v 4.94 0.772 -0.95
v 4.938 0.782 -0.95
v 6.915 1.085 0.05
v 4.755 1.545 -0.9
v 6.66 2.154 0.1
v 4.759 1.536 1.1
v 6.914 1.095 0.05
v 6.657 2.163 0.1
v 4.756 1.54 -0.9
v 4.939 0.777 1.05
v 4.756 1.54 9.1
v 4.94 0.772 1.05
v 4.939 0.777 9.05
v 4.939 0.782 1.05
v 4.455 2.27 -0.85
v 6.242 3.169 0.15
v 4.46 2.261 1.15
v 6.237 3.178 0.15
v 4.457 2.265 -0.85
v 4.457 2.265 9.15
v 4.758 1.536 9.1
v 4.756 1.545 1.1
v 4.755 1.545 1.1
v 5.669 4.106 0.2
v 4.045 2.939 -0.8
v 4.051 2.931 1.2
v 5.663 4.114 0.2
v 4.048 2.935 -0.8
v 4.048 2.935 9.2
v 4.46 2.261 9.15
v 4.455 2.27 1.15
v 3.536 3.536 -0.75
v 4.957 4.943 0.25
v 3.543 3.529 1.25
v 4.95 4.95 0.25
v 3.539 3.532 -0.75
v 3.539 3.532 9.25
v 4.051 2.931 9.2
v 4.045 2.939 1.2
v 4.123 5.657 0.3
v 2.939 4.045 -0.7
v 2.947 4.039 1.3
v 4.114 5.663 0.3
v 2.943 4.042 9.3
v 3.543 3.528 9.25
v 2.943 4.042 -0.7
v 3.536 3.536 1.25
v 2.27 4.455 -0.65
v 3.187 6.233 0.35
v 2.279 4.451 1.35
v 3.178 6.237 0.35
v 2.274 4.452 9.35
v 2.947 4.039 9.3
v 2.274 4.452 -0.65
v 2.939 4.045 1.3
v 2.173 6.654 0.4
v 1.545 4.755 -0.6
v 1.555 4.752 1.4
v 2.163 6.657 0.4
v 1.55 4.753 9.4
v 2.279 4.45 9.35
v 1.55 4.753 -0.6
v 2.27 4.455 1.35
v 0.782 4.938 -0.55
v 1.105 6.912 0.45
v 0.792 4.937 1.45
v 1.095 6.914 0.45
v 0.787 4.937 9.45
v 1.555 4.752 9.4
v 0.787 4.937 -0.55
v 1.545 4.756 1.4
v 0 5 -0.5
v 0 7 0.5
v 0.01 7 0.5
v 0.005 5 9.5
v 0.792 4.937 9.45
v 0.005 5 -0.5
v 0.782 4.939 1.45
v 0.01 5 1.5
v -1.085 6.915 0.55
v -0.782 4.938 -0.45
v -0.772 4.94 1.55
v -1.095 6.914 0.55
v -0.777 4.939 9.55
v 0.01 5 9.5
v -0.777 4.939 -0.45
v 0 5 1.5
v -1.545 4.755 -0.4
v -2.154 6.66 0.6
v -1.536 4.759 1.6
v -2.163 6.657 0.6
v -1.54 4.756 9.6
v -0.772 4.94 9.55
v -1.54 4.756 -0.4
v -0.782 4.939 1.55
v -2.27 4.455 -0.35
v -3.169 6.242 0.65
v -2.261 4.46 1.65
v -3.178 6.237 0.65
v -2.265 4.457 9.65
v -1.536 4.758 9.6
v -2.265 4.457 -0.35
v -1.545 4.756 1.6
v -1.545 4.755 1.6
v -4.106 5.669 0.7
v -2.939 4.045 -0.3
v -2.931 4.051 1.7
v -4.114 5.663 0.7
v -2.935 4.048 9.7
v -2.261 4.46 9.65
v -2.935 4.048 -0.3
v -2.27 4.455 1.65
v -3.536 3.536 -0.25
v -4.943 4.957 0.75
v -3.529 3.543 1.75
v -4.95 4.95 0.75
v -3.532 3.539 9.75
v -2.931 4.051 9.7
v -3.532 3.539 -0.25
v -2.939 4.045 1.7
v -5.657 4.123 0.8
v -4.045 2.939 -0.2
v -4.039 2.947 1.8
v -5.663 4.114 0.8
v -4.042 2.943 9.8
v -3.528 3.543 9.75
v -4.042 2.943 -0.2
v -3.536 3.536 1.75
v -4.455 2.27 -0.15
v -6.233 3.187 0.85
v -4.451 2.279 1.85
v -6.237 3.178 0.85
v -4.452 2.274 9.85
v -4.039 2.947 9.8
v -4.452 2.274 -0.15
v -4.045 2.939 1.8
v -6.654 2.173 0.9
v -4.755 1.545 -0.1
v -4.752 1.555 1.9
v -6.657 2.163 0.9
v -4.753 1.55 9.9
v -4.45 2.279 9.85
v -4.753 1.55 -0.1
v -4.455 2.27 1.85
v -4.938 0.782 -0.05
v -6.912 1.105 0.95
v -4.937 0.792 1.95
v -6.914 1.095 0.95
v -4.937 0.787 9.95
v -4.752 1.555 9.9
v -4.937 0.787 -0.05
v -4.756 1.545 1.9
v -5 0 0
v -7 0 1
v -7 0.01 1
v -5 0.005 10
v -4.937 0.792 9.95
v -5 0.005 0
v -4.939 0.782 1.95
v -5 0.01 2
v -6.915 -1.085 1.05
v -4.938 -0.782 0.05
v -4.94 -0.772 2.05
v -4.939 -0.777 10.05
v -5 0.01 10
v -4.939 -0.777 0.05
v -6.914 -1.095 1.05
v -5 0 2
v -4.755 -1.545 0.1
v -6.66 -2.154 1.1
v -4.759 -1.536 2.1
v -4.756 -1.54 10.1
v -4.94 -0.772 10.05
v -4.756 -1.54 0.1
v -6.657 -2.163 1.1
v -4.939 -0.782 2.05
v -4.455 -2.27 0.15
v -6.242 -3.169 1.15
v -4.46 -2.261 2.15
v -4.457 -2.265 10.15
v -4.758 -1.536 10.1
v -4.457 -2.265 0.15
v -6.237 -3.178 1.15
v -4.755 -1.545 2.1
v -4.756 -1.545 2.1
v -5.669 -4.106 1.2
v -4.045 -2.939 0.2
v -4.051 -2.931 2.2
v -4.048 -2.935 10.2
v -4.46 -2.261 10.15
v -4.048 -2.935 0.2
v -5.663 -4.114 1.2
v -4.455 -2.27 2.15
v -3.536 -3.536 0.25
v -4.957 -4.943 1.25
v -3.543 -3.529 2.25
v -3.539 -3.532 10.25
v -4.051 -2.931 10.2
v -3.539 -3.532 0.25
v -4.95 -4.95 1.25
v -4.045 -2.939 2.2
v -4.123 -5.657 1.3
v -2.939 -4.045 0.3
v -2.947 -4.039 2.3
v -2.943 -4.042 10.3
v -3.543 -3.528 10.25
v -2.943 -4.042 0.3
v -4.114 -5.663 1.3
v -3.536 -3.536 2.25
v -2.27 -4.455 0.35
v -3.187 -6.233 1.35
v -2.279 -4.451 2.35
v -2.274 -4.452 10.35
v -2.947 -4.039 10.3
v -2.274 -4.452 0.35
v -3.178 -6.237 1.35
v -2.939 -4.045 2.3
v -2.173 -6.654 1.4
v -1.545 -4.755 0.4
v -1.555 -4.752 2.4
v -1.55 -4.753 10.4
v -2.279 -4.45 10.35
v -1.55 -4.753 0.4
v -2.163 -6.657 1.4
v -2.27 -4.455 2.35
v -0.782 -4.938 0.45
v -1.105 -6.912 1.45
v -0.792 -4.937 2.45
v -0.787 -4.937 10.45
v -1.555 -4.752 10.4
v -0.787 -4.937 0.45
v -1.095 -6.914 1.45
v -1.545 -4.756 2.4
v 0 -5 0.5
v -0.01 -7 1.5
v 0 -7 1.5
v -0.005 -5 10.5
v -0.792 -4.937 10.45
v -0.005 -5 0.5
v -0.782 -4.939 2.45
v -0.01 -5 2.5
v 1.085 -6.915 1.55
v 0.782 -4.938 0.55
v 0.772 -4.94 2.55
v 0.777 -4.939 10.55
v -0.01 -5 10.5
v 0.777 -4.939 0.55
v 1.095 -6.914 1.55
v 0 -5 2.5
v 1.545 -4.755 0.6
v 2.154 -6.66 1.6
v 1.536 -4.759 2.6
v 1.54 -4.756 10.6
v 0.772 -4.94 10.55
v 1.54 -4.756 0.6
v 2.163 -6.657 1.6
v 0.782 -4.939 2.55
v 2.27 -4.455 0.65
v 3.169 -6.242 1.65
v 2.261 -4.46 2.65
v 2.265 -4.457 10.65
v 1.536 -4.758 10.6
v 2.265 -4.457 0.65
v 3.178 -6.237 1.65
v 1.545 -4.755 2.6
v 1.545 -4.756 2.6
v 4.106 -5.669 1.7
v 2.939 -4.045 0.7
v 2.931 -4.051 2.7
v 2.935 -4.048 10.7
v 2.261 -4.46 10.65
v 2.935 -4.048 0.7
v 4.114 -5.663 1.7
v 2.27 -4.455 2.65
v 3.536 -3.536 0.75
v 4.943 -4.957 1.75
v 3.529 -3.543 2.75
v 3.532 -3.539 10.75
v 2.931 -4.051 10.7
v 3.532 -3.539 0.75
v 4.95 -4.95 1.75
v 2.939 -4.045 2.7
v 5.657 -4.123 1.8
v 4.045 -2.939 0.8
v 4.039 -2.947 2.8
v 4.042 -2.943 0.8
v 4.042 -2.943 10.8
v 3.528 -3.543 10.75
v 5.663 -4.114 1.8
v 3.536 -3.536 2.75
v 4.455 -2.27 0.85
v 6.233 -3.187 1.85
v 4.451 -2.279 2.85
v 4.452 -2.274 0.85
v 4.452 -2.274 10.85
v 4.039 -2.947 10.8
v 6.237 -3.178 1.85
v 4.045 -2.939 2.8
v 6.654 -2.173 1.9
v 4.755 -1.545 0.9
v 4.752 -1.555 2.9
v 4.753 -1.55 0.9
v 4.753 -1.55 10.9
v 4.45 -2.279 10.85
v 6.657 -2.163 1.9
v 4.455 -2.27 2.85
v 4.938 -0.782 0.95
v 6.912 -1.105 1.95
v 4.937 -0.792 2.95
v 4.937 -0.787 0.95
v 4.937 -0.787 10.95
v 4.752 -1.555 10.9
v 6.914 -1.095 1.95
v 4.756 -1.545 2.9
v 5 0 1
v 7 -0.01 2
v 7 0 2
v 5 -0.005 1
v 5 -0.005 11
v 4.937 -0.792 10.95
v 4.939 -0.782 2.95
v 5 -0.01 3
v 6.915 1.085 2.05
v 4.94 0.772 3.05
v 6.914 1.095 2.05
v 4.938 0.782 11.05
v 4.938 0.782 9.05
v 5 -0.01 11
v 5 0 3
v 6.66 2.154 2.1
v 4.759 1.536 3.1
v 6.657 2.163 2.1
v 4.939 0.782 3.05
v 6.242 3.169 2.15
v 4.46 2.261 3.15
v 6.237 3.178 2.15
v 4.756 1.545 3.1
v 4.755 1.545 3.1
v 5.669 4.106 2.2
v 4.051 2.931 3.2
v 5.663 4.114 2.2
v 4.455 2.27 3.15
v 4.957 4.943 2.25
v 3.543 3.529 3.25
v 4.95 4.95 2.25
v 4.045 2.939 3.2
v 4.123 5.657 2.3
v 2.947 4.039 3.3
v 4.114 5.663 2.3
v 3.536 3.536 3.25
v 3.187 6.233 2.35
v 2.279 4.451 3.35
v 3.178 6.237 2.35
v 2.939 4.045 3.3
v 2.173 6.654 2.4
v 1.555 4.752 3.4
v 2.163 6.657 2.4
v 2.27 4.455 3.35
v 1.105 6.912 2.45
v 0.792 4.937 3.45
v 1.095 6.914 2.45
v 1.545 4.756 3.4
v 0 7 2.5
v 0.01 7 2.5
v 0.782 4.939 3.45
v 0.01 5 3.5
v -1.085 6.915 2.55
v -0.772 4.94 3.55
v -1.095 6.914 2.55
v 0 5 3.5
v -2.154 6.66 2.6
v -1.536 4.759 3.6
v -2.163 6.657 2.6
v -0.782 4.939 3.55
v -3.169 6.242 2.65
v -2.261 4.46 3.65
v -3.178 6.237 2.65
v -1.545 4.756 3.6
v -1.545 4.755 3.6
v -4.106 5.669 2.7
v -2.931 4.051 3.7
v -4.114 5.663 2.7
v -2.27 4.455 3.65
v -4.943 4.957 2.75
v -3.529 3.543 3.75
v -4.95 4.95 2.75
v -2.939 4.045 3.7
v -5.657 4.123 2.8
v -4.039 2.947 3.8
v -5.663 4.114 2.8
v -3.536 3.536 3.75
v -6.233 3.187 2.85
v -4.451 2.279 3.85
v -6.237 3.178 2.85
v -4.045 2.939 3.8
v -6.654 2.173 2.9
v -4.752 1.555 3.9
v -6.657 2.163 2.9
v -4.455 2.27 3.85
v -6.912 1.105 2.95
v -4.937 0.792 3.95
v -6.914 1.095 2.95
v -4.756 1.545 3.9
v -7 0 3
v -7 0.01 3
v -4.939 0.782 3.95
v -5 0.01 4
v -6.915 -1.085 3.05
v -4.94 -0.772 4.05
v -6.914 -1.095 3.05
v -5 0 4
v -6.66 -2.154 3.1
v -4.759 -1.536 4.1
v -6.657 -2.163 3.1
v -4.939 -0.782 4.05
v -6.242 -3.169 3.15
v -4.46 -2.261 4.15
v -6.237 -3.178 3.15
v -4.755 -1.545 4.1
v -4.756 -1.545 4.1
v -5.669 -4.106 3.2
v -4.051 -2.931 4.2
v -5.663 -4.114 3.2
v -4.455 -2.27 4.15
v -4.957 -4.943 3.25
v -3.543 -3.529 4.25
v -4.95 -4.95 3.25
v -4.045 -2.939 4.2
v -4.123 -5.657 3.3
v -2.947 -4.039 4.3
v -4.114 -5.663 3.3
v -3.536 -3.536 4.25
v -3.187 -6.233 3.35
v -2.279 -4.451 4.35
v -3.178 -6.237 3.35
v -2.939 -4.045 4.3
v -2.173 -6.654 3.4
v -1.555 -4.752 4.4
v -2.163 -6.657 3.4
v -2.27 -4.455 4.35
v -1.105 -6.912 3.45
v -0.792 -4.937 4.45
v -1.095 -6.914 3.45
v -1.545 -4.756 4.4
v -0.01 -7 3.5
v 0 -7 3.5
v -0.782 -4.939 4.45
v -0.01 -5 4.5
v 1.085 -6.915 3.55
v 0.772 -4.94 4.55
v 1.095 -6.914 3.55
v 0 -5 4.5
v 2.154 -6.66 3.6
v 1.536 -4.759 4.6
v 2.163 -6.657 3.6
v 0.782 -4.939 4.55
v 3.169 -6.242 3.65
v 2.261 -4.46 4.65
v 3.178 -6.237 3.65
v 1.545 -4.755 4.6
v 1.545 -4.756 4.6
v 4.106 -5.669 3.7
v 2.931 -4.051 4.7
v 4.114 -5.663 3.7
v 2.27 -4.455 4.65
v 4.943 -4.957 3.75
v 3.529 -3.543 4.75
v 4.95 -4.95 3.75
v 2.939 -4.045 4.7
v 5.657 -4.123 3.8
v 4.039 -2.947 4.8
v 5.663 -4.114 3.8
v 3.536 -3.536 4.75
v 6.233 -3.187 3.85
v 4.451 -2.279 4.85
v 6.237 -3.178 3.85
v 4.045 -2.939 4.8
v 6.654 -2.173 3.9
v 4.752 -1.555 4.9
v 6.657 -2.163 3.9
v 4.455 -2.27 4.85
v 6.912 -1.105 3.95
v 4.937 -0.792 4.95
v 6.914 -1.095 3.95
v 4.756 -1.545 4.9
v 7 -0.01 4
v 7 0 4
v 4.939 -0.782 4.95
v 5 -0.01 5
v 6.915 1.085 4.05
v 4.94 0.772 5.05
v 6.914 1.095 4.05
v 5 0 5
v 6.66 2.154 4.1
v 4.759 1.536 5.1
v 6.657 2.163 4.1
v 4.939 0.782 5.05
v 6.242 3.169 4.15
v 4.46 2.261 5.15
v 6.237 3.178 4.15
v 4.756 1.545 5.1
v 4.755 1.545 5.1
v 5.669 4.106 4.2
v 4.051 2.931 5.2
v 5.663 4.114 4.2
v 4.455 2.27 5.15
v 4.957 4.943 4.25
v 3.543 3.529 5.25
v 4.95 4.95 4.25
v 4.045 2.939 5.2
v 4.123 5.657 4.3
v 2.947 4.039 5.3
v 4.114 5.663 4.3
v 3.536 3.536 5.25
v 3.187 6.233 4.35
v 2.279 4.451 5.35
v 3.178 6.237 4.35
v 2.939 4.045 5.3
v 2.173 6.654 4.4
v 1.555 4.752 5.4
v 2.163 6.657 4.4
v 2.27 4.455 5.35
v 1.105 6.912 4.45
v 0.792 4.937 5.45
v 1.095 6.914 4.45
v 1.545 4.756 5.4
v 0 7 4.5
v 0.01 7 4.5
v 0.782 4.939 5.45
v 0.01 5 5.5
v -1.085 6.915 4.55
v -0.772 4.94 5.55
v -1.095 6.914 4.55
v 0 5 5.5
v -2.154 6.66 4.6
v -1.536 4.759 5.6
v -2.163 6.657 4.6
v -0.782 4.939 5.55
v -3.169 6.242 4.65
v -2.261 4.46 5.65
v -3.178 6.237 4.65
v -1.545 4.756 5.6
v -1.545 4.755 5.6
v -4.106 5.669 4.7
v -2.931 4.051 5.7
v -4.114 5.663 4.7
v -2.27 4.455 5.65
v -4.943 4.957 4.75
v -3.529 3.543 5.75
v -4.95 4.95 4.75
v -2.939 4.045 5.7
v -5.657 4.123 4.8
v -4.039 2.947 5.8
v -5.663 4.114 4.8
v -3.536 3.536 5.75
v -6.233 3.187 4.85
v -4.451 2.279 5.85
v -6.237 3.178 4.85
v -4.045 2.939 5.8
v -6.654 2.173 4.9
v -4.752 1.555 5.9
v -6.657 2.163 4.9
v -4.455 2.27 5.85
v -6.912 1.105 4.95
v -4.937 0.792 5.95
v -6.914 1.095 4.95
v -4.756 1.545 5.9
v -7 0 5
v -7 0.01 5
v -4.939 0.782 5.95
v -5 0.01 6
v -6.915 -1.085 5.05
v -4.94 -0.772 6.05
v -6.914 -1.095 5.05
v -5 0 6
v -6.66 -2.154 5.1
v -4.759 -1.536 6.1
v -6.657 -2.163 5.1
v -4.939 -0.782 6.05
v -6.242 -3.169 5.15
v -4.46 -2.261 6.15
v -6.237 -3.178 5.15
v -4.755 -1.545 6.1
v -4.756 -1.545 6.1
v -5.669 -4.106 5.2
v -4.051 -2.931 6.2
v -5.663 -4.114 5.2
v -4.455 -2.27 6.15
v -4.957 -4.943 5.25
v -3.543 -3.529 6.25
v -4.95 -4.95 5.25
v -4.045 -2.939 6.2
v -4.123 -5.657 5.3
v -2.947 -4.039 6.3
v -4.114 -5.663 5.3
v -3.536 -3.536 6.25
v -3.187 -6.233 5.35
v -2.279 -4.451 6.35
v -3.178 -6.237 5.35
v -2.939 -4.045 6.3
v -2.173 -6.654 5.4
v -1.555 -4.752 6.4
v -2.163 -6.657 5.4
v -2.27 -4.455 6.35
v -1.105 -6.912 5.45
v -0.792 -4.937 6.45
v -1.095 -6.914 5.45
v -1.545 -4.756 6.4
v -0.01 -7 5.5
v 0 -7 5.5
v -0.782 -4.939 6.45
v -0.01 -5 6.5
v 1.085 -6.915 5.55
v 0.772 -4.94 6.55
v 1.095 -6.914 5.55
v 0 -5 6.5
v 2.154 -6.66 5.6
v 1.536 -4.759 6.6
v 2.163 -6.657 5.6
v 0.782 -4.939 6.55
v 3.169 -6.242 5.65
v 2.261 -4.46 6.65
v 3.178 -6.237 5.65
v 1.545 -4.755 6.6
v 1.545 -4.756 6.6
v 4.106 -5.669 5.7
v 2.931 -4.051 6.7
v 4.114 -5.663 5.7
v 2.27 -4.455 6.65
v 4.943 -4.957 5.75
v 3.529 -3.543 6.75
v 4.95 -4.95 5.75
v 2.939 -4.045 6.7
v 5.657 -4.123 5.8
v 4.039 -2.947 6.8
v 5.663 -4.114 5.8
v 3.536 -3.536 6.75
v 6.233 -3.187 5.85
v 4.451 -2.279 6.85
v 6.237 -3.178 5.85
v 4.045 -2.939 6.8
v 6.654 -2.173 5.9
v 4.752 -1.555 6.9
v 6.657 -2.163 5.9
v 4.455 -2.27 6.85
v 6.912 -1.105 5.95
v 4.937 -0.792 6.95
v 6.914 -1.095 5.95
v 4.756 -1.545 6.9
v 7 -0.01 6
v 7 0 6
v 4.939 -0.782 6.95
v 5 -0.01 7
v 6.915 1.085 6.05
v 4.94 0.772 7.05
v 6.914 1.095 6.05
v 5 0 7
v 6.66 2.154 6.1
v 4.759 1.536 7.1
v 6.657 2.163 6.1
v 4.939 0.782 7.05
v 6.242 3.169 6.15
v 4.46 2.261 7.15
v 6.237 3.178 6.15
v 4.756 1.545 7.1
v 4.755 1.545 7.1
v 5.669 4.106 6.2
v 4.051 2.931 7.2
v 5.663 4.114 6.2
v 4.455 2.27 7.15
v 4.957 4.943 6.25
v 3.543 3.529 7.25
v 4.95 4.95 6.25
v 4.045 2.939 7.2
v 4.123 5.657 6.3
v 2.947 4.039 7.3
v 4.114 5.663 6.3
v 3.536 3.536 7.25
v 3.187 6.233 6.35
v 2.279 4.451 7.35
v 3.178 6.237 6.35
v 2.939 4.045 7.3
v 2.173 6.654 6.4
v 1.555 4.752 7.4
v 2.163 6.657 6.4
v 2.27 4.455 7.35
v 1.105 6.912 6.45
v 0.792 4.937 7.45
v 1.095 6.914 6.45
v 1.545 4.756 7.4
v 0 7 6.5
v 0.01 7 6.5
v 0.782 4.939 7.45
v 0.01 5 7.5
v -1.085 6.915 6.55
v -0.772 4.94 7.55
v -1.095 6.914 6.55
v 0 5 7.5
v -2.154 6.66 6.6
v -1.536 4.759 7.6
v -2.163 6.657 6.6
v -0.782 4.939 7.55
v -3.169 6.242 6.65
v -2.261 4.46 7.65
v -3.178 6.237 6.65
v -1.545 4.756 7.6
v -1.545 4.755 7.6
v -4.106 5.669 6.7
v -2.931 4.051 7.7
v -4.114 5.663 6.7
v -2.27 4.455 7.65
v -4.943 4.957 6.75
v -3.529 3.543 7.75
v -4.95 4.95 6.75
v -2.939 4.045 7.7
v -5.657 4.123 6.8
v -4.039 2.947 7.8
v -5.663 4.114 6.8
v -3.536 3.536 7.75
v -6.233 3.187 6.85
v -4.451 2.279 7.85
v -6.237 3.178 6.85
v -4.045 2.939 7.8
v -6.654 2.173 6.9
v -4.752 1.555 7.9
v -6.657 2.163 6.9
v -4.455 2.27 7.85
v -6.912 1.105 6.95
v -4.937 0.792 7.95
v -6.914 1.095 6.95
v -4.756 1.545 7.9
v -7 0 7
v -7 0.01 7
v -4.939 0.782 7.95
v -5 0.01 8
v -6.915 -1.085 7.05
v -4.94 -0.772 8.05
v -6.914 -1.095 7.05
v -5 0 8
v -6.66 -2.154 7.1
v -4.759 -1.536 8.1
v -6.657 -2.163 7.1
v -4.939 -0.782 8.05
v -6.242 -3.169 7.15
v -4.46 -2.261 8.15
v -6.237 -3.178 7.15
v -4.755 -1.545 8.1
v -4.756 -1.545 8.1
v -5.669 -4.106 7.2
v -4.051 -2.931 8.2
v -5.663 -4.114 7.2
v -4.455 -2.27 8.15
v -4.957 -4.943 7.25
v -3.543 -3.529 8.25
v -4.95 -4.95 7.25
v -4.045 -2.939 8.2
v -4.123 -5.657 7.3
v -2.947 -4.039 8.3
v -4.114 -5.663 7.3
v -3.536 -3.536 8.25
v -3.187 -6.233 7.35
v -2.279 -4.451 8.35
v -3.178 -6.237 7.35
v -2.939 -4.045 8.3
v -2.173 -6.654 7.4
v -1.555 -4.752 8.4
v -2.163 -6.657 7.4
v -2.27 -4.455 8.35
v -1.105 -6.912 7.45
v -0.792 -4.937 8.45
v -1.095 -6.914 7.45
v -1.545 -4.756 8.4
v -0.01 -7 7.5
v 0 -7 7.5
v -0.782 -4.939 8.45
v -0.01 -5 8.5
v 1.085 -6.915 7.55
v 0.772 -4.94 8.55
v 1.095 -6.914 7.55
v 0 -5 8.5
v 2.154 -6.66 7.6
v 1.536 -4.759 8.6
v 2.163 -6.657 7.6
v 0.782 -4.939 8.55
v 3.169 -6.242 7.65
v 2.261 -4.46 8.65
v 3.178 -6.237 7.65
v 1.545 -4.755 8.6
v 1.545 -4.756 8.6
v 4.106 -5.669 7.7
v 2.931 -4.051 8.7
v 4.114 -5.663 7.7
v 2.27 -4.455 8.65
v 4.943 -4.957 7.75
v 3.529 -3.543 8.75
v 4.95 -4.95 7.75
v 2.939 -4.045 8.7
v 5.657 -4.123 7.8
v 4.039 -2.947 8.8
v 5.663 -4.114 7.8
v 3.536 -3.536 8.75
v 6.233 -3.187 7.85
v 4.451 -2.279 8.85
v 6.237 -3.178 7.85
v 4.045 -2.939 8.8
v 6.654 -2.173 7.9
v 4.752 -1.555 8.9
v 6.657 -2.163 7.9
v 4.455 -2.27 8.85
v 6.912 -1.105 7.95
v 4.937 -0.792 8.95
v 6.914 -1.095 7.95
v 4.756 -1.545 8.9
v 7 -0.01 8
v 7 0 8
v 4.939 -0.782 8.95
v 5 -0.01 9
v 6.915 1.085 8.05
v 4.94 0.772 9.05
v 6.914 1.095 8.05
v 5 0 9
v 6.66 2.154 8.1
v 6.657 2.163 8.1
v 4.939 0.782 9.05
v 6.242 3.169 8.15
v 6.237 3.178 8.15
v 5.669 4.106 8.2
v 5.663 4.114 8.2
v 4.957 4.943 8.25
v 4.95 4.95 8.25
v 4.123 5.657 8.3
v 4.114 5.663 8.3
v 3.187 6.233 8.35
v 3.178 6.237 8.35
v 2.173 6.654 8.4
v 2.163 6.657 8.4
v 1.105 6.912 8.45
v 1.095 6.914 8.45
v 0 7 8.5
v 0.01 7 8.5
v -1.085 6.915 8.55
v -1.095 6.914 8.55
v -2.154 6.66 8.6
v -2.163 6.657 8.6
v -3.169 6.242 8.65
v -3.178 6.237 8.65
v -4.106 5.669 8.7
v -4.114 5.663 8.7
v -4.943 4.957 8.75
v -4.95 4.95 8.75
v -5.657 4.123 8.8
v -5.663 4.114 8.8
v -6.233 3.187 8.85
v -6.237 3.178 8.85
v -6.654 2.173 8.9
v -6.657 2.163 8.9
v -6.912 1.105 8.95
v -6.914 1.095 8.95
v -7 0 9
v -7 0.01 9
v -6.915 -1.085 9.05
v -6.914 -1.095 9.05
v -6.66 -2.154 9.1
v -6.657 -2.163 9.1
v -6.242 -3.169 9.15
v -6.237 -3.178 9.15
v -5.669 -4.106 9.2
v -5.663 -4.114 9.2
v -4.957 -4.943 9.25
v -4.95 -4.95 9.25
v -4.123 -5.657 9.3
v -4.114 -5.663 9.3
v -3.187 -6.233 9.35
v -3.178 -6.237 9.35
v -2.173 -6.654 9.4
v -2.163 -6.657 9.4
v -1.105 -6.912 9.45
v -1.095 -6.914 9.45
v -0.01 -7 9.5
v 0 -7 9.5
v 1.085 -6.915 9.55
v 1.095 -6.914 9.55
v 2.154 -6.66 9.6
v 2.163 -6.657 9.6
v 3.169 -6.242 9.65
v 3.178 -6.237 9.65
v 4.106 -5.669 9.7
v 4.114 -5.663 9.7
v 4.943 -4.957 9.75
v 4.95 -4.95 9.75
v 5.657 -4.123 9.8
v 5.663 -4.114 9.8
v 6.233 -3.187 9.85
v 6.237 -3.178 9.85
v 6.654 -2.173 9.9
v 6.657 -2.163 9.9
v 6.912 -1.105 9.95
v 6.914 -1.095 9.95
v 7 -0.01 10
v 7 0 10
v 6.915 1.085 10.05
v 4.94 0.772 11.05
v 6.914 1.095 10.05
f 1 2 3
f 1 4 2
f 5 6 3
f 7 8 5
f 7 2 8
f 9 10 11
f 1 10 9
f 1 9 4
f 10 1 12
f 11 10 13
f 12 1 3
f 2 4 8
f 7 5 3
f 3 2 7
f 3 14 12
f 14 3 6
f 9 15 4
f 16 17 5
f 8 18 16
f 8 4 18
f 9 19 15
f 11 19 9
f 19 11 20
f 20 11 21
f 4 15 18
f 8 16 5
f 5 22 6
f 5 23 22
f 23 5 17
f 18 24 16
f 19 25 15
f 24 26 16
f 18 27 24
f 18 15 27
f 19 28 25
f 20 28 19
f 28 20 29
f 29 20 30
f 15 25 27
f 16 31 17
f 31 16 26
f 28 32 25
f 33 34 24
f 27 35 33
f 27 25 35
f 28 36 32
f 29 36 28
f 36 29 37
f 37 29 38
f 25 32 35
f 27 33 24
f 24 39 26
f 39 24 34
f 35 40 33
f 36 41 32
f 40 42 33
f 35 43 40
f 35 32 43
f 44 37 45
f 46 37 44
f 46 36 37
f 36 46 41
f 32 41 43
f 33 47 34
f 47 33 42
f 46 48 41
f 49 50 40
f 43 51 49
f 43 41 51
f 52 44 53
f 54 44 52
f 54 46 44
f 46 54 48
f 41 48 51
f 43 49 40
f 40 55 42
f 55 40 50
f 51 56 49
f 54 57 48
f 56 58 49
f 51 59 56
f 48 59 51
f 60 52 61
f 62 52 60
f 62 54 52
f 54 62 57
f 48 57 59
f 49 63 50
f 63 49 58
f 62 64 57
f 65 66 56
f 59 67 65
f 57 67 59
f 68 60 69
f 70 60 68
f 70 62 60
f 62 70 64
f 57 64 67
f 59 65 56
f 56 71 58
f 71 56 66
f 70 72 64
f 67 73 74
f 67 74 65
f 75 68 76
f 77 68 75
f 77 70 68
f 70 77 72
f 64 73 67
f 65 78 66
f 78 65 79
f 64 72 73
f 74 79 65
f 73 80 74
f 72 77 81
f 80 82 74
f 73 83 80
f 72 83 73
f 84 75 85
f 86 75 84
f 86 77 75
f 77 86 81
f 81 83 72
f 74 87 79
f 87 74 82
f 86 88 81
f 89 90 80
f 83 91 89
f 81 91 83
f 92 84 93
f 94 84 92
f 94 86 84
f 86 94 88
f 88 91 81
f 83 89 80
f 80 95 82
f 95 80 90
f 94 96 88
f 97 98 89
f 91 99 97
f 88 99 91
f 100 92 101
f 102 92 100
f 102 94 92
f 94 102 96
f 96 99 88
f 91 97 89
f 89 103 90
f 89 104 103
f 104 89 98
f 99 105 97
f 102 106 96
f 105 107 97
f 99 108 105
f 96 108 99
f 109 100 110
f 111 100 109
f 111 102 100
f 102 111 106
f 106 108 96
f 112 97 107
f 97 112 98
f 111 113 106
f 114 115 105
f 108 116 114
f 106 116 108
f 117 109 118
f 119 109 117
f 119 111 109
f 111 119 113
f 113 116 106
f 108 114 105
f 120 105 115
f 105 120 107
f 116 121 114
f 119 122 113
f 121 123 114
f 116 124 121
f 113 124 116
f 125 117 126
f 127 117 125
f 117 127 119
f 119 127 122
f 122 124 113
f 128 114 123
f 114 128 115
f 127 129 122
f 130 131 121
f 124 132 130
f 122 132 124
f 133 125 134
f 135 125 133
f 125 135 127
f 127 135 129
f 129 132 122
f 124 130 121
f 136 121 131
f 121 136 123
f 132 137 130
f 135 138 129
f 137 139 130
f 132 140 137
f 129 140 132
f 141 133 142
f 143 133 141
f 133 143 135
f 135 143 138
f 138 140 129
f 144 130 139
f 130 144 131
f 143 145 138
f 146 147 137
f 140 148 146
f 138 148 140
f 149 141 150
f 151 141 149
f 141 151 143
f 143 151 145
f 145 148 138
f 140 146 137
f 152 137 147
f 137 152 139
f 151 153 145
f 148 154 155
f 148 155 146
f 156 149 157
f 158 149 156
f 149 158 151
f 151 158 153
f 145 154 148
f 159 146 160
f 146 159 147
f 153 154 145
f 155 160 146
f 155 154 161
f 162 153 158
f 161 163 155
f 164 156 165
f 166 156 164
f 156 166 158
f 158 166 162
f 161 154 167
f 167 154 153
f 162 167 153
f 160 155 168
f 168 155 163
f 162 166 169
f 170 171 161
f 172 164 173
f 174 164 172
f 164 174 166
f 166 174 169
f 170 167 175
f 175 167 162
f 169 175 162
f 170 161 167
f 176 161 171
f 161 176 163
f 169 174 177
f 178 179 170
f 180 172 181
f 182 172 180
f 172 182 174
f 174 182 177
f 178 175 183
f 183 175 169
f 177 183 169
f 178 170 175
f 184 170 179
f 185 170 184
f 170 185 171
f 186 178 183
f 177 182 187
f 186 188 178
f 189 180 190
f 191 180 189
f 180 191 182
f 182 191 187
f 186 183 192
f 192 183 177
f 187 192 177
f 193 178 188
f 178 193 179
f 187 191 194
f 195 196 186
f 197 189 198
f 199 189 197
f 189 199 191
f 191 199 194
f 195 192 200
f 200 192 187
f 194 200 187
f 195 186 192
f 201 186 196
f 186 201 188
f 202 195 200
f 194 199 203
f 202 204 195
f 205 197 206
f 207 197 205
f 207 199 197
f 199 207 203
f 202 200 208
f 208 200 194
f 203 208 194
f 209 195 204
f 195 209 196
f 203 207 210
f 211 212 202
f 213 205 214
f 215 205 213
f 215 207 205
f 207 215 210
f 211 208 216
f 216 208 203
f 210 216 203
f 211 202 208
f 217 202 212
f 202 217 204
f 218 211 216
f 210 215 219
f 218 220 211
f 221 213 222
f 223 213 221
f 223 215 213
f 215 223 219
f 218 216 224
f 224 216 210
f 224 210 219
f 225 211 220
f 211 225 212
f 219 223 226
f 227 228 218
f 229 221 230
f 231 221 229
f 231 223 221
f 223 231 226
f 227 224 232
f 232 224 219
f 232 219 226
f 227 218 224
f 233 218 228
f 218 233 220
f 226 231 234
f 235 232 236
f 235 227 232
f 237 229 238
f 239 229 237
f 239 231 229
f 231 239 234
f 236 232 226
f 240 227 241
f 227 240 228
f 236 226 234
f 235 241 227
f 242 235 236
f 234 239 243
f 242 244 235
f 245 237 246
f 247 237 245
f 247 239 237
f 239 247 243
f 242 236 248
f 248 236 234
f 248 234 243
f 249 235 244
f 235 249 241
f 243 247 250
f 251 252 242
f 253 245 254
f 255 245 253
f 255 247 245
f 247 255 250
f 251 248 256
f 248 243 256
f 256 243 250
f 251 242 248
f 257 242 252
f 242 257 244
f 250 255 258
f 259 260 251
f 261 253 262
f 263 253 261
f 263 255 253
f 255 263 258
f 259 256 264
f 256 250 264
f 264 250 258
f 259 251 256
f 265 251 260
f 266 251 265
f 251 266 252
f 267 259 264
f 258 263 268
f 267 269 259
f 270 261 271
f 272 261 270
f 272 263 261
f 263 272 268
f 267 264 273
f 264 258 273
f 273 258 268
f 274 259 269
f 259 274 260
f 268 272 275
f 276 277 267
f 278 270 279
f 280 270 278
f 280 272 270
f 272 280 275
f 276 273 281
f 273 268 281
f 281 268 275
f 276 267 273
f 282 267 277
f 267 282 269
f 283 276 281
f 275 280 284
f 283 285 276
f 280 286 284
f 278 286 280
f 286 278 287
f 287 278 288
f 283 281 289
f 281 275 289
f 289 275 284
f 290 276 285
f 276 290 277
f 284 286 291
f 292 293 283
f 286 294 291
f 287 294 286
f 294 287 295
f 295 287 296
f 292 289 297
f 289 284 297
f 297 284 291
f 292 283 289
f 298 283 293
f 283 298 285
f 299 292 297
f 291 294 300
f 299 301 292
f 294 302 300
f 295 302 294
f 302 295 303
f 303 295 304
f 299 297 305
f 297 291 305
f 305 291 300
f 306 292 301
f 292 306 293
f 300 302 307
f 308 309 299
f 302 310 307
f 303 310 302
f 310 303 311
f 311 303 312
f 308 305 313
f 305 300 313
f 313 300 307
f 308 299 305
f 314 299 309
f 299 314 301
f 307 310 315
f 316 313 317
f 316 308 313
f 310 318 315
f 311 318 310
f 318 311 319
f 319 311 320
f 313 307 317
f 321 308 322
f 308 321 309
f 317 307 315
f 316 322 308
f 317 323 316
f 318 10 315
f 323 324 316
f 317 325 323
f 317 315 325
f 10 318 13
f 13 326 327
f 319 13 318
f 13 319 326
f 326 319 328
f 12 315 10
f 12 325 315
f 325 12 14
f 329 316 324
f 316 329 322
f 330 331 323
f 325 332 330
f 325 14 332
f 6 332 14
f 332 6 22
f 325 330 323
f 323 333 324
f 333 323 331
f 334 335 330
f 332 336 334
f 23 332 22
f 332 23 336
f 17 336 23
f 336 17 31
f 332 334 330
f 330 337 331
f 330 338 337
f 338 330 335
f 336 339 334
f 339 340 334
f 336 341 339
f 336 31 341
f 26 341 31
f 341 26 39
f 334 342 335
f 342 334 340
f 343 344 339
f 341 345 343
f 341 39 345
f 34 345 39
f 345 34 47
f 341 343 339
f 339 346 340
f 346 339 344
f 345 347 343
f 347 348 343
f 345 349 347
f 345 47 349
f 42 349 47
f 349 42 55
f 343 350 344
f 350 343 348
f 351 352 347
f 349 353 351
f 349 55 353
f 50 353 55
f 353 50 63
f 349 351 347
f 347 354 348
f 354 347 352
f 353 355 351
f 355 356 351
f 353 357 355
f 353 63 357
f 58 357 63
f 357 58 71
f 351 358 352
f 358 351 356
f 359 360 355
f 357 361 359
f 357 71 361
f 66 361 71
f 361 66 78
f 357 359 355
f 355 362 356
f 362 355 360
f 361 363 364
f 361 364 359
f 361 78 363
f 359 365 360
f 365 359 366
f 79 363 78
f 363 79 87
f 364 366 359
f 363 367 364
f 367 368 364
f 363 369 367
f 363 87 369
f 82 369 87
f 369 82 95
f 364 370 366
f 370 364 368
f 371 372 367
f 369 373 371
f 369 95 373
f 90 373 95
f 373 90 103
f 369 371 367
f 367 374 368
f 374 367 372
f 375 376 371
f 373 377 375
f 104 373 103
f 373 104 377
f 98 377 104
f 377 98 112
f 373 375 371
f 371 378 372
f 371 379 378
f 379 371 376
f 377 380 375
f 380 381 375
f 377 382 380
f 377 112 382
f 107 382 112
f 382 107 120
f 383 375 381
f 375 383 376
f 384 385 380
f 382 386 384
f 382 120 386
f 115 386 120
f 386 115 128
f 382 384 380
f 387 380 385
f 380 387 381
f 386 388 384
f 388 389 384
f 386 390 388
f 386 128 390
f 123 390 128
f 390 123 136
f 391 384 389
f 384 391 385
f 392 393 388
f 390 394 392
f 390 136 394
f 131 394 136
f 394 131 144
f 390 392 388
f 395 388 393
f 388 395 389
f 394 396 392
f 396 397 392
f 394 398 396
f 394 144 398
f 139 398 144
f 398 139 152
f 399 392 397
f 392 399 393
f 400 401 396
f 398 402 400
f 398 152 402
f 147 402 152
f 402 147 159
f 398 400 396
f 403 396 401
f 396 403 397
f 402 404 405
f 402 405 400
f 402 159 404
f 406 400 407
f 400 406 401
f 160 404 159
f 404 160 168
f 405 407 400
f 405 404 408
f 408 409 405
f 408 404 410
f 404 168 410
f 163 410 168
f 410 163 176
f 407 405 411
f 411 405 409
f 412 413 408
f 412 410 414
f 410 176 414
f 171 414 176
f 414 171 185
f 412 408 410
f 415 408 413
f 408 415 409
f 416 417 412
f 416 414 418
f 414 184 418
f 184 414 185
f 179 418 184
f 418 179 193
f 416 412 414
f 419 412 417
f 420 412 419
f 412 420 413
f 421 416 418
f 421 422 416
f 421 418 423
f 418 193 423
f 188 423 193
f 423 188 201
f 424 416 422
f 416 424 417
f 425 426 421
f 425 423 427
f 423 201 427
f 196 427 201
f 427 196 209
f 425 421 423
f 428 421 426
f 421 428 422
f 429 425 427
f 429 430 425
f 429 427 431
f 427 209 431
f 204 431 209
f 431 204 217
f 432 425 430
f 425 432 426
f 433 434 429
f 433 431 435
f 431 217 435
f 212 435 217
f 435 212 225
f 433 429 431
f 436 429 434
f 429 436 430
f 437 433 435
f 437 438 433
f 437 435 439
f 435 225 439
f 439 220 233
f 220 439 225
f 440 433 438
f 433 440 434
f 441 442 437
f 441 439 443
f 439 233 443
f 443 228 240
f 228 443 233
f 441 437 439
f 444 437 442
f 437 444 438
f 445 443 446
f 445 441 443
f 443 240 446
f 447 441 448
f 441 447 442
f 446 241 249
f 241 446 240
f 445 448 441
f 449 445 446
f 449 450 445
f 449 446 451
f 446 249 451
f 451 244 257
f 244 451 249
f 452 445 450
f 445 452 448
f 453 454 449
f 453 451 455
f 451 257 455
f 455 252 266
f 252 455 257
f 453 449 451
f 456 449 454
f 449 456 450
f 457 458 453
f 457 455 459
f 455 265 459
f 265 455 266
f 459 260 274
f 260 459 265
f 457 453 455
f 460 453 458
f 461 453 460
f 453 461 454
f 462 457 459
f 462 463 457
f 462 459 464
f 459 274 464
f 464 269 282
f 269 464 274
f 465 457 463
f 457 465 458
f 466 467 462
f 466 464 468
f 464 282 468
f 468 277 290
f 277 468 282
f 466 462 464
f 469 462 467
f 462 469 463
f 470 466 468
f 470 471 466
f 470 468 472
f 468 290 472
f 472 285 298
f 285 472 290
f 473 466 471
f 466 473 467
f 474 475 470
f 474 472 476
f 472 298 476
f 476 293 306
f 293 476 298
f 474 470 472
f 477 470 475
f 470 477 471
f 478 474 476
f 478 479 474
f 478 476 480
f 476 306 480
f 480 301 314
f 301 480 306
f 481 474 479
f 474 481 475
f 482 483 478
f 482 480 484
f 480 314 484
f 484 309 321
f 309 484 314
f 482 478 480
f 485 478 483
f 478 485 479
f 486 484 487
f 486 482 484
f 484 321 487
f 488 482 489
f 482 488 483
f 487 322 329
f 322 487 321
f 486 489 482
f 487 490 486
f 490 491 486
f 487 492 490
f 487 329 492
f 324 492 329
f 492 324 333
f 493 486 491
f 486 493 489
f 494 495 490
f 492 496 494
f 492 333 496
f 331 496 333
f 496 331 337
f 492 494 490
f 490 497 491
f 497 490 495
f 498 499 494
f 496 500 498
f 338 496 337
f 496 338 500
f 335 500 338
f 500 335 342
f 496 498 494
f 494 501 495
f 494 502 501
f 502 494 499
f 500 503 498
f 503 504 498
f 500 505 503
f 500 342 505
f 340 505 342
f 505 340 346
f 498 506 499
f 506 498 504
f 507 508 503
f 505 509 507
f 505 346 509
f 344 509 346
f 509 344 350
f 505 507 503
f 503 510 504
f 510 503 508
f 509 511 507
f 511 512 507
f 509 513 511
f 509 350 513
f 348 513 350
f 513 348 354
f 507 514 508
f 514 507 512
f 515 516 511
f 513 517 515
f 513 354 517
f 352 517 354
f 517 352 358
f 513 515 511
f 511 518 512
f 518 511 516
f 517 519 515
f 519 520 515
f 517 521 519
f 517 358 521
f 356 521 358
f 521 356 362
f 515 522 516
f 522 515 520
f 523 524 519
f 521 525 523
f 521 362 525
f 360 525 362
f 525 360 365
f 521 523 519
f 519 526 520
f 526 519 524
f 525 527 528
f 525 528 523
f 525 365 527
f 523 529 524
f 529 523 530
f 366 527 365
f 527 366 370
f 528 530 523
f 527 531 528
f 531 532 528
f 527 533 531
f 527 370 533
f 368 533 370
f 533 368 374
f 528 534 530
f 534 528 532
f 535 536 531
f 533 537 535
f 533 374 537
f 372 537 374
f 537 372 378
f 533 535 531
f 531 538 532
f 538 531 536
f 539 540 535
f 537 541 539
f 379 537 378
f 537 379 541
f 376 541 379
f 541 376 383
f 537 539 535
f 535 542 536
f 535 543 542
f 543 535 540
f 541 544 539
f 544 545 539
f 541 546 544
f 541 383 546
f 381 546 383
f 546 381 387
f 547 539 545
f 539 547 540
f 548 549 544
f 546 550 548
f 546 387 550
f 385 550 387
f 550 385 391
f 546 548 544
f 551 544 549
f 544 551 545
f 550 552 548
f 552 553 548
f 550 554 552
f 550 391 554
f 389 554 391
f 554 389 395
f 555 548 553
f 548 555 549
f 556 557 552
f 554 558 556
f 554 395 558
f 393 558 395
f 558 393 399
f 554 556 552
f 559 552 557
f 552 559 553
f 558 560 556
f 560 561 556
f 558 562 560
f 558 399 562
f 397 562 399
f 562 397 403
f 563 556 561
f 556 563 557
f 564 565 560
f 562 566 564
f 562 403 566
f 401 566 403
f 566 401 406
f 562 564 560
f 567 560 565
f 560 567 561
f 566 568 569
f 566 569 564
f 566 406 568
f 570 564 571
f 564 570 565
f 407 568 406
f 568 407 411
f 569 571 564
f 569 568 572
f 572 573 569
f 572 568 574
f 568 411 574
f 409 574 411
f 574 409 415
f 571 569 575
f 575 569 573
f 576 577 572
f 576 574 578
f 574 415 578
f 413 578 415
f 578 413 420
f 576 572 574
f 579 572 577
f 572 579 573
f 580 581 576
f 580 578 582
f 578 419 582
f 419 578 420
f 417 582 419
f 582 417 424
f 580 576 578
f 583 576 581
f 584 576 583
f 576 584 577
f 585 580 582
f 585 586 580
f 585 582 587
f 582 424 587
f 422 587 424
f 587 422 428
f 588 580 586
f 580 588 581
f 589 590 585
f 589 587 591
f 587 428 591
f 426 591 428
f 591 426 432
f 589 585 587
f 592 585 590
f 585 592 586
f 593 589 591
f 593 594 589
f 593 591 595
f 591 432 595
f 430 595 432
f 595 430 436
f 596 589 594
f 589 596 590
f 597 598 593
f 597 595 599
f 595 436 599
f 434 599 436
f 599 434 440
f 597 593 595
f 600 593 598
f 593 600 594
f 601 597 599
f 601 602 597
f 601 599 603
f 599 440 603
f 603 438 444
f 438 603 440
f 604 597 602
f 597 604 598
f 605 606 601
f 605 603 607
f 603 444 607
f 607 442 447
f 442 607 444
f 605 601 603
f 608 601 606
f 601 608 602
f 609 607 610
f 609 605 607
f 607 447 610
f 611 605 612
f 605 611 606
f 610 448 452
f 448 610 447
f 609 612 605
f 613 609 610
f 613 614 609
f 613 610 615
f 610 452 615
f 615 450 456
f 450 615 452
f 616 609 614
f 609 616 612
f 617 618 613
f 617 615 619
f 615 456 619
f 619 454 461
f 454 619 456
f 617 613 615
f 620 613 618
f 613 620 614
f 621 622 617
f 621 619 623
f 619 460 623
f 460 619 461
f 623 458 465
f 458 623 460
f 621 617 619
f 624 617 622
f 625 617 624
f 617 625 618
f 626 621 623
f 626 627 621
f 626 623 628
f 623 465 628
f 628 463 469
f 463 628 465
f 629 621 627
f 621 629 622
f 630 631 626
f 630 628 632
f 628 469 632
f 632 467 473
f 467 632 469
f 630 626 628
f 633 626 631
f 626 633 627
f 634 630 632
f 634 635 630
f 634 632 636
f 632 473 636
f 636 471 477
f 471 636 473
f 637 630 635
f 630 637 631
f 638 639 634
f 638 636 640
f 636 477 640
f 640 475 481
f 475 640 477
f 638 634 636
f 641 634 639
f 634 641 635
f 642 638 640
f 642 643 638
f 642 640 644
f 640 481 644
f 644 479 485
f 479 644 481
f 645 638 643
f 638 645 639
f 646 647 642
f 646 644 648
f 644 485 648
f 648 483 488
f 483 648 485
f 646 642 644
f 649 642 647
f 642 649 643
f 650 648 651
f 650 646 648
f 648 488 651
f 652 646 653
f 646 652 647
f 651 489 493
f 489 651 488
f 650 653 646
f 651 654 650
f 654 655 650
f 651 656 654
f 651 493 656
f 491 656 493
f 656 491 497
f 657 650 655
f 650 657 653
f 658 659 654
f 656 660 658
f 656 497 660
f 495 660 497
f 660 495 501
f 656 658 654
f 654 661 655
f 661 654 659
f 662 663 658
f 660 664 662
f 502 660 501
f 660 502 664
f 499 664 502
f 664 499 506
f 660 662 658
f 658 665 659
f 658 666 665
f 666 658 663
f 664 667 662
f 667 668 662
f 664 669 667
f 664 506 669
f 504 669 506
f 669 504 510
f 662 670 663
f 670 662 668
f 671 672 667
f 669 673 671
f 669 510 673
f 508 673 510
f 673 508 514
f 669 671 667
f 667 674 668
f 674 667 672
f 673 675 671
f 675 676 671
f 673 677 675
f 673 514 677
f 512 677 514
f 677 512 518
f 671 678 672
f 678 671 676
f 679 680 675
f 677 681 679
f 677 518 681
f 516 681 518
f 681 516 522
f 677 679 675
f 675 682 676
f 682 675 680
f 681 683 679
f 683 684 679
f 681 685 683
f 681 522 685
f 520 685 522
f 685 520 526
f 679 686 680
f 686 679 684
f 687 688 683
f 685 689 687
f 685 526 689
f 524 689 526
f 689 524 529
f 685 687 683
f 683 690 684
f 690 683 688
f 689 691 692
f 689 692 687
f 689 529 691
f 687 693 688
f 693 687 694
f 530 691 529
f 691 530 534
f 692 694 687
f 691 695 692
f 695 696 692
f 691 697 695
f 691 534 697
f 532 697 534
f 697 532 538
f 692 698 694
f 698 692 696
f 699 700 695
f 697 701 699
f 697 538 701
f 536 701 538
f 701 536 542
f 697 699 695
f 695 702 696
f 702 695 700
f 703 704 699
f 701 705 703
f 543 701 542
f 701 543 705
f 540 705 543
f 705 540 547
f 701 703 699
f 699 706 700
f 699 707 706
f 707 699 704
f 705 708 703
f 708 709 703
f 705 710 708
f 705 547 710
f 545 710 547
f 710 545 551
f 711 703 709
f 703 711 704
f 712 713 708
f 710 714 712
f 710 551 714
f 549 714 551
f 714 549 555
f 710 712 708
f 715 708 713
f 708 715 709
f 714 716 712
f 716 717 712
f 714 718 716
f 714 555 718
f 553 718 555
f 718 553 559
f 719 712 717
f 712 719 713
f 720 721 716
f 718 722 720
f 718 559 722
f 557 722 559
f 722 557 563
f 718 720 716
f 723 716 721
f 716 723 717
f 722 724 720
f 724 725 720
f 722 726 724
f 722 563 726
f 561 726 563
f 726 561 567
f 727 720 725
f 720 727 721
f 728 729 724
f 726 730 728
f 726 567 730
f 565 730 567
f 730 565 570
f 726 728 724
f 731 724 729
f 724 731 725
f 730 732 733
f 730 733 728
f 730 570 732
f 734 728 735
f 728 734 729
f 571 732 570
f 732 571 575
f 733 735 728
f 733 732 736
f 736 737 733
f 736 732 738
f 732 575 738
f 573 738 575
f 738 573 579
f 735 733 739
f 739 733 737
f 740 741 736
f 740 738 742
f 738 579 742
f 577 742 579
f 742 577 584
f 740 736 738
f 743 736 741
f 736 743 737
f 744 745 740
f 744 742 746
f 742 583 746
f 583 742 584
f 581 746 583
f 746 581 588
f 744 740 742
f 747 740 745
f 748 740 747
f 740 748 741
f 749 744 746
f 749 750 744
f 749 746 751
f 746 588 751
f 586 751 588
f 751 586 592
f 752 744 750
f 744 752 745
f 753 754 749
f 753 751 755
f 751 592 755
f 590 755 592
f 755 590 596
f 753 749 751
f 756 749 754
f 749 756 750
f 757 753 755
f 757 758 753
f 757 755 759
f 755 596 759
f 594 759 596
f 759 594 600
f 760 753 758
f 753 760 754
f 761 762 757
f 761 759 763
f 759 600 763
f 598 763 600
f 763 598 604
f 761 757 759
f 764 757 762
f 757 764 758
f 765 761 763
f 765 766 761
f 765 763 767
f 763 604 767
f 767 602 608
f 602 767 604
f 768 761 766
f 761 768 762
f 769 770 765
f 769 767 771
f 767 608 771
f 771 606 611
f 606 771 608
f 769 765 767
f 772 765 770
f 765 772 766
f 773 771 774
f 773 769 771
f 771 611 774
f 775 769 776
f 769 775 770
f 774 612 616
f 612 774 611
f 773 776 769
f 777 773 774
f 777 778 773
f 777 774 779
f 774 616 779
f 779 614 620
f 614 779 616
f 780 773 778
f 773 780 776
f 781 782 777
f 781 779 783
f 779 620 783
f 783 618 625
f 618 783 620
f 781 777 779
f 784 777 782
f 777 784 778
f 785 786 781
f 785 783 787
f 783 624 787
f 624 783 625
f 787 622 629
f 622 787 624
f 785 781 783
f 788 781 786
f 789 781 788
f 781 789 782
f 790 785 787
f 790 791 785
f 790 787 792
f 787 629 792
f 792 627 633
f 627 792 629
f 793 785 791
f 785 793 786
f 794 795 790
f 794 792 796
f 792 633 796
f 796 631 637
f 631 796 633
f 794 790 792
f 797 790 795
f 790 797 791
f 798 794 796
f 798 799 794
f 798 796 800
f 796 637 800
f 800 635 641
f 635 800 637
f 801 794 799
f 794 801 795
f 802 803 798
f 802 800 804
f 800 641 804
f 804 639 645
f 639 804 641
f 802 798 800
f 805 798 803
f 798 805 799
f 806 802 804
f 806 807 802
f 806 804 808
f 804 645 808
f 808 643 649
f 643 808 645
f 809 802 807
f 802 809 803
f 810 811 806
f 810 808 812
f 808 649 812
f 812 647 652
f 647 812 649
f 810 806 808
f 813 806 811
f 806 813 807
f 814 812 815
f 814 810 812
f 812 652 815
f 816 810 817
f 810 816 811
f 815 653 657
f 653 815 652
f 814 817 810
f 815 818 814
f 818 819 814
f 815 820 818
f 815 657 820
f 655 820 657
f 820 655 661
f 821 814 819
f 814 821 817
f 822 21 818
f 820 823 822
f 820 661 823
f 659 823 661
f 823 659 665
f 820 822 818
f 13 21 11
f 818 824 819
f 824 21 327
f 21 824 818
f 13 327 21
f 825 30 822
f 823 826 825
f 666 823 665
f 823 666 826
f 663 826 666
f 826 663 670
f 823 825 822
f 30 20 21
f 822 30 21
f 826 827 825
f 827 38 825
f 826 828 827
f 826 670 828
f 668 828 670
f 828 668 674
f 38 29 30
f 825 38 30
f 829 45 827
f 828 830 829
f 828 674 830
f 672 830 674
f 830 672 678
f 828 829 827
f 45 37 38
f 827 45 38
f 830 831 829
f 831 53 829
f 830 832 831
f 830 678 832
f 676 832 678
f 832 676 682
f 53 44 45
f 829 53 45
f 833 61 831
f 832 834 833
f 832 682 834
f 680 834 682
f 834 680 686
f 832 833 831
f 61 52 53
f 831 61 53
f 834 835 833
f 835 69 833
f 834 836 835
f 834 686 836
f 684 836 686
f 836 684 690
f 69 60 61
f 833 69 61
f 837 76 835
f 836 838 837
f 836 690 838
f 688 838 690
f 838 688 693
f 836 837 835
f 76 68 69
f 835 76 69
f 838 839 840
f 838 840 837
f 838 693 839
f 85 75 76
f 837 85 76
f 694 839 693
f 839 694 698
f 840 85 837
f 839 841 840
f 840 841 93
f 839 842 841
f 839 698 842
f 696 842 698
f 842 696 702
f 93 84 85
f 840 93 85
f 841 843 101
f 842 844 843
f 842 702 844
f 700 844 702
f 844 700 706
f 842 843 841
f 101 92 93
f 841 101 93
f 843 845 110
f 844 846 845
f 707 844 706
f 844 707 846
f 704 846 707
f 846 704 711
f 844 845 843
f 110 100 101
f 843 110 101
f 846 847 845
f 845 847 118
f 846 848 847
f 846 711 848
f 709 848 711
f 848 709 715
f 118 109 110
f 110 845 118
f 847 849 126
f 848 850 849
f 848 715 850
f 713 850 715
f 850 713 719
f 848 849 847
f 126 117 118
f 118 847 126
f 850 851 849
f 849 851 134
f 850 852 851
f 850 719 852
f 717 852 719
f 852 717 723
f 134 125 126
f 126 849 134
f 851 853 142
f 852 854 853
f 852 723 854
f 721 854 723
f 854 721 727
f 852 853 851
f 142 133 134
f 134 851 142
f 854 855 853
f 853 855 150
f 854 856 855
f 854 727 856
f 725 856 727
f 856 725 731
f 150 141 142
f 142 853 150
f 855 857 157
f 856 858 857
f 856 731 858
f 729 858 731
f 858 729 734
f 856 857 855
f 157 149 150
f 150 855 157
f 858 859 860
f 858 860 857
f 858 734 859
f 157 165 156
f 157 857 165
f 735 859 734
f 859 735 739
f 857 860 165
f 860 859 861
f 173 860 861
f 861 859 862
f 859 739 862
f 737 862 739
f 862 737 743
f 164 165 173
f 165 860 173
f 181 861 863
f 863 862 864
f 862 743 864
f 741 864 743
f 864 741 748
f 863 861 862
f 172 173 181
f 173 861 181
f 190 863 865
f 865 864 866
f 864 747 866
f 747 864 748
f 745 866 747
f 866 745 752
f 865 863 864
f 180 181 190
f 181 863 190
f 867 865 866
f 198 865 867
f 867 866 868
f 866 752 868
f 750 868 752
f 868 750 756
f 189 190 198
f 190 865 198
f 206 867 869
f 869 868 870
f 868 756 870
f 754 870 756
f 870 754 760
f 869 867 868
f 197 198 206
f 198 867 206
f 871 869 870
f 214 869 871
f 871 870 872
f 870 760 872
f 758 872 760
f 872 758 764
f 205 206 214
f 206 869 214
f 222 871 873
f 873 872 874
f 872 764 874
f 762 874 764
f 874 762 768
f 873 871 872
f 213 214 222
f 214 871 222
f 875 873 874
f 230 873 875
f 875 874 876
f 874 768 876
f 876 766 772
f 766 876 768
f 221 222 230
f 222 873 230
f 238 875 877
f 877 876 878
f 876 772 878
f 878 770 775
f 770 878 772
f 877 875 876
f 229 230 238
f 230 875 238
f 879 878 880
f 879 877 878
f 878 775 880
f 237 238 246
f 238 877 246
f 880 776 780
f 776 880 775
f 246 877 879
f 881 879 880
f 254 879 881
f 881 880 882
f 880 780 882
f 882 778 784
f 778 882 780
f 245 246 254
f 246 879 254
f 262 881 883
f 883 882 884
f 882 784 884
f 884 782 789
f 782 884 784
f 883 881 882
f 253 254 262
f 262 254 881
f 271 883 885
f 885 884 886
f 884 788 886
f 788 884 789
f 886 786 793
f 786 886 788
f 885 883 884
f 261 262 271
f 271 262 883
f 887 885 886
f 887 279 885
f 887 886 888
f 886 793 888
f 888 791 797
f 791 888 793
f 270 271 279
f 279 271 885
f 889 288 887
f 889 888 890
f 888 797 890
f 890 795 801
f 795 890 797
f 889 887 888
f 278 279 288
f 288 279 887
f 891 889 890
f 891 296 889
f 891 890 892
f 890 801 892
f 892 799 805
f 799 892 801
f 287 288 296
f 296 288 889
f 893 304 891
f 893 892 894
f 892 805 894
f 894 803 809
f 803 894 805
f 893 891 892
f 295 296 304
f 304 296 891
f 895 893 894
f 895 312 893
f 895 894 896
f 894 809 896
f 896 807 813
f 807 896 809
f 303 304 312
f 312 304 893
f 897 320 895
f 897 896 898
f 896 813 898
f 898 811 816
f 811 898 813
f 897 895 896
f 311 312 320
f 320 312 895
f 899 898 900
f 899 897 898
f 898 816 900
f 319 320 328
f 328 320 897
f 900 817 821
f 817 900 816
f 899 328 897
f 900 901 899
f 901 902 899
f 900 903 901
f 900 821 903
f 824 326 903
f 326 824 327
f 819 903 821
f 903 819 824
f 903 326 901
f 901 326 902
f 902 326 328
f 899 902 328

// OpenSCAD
resolution = 200;
height = 10;
turns = 5;
innerdiameter = 5;
width = 2;
outerdiameter = innerdiameter + width;

for(i=[1:resolution]) {
  rotate(a=[0,0,(turns * 360 * i)/resolution])
  translate([0,0,i * height/resolution])
    hull(){
      rotate([90,0,0])
        linear_extrude(height=0.01)
          polygon([[innerdiameter,1],[innerdiameter,-1],[outerdiameter,0]]);

      translate([0,0,height/resolution])
        rotate([0,0,turns * 360/resolution])
        rotate([90,0,0])
          linear_extrude(height=0.01)
            polygon([[innerdiameter,1],[innerdiameter,-1],[outerdiameter,0]]);
    }
}
